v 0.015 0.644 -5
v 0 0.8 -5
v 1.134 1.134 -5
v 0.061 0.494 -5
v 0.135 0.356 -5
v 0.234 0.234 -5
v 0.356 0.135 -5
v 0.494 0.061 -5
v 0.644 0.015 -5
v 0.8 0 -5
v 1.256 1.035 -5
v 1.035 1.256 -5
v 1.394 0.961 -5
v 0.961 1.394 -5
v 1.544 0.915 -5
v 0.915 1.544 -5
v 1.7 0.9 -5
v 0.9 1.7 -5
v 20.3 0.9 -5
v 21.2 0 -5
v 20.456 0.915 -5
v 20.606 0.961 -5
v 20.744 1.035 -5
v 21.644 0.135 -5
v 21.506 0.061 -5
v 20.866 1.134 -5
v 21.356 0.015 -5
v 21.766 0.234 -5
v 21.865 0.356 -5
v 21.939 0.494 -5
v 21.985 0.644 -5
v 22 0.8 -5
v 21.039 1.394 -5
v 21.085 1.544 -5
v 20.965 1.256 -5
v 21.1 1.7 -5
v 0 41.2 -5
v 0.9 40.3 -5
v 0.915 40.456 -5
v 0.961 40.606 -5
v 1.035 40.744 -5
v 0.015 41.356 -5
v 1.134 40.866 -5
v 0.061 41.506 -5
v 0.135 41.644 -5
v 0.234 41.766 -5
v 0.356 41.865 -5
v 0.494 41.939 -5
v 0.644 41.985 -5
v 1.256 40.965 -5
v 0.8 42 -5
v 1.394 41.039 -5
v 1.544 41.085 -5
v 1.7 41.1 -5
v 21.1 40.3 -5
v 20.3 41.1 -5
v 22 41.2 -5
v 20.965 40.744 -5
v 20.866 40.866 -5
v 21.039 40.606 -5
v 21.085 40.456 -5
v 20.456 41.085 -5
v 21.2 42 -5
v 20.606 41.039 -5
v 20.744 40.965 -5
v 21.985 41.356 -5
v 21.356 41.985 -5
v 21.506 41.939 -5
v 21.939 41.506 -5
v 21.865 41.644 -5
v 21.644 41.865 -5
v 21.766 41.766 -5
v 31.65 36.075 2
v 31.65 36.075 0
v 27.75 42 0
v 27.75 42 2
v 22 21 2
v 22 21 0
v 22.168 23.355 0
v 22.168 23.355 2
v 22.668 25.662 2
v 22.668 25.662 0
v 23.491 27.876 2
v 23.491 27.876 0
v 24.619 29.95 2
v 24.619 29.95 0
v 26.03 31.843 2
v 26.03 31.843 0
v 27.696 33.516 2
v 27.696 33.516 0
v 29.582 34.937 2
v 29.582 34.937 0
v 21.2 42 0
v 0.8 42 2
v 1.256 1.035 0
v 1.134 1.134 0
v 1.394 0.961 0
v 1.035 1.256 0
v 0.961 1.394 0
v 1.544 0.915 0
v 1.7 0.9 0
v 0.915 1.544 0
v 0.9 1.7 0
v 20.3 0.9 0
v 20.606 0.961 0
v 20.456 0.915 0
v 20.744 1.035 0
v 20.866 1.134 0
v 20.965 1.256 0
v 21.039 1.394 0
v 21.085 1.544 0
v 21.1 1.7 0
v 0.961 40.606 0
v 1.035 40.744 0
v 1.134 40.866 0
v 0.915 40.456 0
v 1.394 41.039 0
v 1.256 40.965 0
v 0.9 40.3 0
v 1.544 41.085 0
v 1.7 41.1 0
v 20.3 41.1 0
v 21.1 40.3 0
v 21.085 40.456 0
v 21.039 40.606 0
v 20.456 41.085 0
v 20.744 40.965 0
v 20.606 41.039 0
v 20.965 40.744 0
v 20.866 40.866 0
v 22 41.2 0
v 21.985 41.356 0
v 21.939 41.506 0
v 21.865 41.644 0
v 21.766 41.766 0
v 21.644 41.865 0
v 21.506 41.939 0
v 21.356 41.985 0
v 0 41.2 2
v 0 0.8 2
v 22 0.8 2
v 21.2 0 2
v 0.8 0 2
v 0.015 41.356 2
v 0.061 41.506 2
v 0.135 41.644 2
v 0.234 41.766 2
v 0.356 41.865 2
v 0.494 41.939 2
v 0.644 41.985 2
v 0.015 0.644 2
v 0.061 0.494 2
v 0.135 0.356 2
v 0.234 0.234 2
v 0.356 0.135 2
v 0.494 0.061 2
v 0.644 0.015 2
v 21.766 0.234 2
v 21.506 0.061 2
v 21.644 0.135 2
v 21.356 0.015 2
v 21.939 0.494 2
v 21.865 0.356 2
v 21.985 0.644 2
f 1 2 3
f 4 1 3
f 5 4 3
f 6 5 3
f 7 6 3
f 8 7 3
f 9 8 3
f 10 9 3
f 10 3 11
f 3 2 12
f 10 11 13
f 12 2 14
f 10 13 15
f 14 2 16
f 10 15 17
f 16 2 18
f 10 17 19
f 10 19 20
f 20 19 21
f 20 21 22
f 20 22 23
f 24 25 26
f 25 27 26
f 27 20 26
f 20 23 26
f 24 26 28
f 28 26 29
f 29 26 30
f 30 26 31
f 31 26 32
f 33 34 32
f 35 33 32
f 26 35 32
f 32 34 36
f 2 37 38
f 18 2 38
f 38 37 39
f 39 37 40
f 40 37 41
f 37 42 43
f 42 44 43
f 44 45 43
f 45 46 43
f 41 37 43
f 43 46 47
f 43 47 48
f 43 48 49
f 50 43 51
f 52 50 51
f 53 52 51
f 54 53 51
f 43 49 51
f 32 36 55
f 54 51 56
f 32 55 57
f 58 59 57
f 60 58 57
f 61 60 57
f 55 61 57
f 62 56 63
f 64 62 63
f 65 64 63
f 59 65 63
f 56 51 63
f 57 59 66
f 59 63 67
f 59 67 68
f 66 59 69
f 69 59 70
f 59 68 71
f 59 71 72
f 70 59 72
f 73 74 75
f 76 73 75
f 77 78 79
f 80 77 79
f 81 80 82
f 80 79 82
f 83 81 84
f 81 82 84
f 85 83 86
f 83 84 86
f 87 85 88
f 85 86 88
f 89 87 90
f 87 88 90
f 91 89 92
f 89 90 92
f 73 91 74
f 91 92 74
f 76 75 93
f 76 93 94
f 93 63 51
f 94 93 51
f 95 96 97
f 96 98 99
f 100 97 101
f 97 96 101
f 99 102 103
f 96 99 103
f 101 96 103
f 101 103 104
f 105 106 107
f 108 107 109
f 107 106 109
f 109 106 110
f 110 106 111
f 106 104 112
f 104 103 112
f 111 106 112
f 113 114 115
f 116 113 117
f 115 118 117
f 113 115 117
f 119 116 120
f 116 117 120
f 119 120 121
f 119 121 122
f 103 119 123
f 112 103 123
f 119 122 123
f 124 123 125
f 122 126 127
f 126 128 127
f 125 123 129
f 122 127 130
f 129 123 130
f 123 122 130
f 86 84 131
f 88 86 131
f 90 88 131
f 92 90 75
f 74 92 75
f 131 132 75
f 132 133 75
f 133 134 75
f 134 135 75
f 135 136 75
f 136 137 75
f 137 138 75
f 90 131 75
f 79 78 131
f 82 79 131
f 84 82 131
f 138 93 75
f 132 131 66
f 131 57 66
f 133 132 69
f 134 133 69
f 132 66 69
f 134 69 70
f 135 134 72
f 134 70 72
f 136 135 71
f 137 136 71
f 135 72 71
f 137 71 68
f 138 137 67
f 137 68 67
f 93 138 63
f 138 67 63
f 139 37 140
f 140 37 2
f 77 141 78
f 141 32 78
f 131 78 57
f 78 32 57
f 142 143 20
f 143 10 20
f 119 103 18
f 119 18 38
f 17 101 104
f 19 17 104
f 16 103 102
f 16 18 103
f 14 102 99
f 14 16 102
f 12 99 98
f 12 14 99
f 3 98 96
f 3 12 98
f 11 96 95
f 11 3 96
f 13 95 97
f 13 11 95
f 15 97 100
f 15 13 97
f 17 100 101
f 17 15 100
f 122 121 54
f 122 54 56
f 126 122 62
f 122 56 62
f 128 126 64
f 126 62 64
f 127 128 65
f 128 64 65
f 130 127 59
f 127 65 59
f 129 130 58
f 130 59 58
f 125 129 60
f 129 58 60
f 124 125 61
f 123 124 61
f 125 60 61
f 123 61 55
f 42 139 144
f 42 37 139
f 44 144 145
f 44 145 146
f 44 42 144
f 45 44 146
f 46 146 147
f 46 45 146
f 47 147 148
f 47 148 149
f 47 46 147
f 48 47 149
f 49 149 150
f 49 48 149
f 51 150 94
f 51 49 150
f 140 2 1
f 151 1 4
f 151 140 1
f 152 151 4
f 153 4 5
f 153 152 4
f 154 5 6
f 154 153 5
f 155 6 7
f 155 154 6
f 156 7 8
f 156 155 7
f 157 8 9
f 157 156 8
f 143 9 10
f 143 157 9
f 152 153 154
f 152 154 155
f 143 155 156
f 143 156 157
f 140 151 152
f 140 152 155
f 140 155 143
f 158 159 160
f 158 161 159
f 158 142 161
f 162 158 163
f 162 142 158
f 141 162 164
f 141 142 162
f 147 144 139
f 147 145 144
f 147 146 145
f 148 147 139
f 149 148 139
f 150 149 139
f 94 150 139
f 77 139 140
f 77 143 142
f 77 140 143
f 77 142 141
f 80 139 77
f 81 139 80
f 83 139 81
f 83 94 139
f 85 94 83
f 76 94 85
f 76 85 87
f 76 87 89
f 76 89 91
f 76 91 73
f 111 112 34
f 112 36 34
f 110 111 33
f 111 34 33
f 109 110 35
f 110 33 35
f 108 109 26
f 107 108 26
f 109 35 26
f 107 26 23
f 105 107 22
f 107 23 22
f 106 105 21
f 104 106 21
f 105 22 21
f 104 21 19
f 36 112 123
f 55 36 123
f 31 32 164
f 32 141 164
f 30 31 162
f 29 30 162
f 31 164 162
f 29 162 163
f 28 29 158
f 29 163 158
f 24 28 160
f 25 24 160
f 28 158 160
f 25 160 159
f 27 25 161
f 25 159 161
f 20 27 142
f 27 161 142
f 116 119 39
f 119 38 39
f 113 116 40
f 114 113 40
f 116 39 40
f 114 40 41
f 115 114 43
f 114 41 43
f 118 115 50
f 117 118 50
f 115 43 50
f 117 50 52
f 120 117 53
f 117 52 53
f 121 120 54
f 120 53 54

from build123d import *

# Parameters (mm, degrees)
F0_W     = 22
F0_H     = 42
F0_W_2   = 20.2
F0_H_2   = 40.2
F1_DEPTH = 5
F2_W     = 20.2
F2_H     = 40.2
F3_DEPTH = 2
F4_R     = 0.8


with BuildPart() as f1:
    # F0 (on Top) → F1 (new body)
    with BuildSketch(Plane.XY):
        with Locations((11, 21)):
            Rectangle(F0_W, F0_H)
        with Locations((11, 21)):
            Rectangle(F0_W_2, F0_H_2, mode=Mode.SUBTRACT)
    extrude(amount=-F1_DEPTH)

    # F2 (on face) → F3 (join)
    with BuildSketch(Plane.XY):
        Polygon((0, 42), (0, 0), (22, 0), (22, 21), (22, 42), align=None)
        with Locations((11, 21)):
            Rectangle(F2_W, F2_H, mode=Mode.SUBTRACT)
        with Locations((11, 21)):
            Rectangle(F2_W, F2_H)
        with BuildLine():
            Line((22, 42), (22, 21))
            ThreePointArc((22, 21), (24.6191216351, 29.9495548074), (31.65, 36.075))
            Line((31.65, 36.075), (27.75, 42))
            Line((27.75, 42), (22, 42))
        make_face()
    extrude(amount=F3_DEPTH)

    # F4
    f4_edges = [f1.edges().sort_by_distance(p)[0] for p in [
        (22, 0, -1.5),
        (0, 0, -1.5),
        (0, 42, -1.5),
        (22, 42, -2.5),
        (21.1, 0.9, -2.5),
        (21.1, 41.1, -2.5),
        (0.9, 0.9, -2.5),
        (0.9, 41.1, -2.5),
    ]]
    fillet(f4_edges, radius=F4_R)


solid = f1.part
